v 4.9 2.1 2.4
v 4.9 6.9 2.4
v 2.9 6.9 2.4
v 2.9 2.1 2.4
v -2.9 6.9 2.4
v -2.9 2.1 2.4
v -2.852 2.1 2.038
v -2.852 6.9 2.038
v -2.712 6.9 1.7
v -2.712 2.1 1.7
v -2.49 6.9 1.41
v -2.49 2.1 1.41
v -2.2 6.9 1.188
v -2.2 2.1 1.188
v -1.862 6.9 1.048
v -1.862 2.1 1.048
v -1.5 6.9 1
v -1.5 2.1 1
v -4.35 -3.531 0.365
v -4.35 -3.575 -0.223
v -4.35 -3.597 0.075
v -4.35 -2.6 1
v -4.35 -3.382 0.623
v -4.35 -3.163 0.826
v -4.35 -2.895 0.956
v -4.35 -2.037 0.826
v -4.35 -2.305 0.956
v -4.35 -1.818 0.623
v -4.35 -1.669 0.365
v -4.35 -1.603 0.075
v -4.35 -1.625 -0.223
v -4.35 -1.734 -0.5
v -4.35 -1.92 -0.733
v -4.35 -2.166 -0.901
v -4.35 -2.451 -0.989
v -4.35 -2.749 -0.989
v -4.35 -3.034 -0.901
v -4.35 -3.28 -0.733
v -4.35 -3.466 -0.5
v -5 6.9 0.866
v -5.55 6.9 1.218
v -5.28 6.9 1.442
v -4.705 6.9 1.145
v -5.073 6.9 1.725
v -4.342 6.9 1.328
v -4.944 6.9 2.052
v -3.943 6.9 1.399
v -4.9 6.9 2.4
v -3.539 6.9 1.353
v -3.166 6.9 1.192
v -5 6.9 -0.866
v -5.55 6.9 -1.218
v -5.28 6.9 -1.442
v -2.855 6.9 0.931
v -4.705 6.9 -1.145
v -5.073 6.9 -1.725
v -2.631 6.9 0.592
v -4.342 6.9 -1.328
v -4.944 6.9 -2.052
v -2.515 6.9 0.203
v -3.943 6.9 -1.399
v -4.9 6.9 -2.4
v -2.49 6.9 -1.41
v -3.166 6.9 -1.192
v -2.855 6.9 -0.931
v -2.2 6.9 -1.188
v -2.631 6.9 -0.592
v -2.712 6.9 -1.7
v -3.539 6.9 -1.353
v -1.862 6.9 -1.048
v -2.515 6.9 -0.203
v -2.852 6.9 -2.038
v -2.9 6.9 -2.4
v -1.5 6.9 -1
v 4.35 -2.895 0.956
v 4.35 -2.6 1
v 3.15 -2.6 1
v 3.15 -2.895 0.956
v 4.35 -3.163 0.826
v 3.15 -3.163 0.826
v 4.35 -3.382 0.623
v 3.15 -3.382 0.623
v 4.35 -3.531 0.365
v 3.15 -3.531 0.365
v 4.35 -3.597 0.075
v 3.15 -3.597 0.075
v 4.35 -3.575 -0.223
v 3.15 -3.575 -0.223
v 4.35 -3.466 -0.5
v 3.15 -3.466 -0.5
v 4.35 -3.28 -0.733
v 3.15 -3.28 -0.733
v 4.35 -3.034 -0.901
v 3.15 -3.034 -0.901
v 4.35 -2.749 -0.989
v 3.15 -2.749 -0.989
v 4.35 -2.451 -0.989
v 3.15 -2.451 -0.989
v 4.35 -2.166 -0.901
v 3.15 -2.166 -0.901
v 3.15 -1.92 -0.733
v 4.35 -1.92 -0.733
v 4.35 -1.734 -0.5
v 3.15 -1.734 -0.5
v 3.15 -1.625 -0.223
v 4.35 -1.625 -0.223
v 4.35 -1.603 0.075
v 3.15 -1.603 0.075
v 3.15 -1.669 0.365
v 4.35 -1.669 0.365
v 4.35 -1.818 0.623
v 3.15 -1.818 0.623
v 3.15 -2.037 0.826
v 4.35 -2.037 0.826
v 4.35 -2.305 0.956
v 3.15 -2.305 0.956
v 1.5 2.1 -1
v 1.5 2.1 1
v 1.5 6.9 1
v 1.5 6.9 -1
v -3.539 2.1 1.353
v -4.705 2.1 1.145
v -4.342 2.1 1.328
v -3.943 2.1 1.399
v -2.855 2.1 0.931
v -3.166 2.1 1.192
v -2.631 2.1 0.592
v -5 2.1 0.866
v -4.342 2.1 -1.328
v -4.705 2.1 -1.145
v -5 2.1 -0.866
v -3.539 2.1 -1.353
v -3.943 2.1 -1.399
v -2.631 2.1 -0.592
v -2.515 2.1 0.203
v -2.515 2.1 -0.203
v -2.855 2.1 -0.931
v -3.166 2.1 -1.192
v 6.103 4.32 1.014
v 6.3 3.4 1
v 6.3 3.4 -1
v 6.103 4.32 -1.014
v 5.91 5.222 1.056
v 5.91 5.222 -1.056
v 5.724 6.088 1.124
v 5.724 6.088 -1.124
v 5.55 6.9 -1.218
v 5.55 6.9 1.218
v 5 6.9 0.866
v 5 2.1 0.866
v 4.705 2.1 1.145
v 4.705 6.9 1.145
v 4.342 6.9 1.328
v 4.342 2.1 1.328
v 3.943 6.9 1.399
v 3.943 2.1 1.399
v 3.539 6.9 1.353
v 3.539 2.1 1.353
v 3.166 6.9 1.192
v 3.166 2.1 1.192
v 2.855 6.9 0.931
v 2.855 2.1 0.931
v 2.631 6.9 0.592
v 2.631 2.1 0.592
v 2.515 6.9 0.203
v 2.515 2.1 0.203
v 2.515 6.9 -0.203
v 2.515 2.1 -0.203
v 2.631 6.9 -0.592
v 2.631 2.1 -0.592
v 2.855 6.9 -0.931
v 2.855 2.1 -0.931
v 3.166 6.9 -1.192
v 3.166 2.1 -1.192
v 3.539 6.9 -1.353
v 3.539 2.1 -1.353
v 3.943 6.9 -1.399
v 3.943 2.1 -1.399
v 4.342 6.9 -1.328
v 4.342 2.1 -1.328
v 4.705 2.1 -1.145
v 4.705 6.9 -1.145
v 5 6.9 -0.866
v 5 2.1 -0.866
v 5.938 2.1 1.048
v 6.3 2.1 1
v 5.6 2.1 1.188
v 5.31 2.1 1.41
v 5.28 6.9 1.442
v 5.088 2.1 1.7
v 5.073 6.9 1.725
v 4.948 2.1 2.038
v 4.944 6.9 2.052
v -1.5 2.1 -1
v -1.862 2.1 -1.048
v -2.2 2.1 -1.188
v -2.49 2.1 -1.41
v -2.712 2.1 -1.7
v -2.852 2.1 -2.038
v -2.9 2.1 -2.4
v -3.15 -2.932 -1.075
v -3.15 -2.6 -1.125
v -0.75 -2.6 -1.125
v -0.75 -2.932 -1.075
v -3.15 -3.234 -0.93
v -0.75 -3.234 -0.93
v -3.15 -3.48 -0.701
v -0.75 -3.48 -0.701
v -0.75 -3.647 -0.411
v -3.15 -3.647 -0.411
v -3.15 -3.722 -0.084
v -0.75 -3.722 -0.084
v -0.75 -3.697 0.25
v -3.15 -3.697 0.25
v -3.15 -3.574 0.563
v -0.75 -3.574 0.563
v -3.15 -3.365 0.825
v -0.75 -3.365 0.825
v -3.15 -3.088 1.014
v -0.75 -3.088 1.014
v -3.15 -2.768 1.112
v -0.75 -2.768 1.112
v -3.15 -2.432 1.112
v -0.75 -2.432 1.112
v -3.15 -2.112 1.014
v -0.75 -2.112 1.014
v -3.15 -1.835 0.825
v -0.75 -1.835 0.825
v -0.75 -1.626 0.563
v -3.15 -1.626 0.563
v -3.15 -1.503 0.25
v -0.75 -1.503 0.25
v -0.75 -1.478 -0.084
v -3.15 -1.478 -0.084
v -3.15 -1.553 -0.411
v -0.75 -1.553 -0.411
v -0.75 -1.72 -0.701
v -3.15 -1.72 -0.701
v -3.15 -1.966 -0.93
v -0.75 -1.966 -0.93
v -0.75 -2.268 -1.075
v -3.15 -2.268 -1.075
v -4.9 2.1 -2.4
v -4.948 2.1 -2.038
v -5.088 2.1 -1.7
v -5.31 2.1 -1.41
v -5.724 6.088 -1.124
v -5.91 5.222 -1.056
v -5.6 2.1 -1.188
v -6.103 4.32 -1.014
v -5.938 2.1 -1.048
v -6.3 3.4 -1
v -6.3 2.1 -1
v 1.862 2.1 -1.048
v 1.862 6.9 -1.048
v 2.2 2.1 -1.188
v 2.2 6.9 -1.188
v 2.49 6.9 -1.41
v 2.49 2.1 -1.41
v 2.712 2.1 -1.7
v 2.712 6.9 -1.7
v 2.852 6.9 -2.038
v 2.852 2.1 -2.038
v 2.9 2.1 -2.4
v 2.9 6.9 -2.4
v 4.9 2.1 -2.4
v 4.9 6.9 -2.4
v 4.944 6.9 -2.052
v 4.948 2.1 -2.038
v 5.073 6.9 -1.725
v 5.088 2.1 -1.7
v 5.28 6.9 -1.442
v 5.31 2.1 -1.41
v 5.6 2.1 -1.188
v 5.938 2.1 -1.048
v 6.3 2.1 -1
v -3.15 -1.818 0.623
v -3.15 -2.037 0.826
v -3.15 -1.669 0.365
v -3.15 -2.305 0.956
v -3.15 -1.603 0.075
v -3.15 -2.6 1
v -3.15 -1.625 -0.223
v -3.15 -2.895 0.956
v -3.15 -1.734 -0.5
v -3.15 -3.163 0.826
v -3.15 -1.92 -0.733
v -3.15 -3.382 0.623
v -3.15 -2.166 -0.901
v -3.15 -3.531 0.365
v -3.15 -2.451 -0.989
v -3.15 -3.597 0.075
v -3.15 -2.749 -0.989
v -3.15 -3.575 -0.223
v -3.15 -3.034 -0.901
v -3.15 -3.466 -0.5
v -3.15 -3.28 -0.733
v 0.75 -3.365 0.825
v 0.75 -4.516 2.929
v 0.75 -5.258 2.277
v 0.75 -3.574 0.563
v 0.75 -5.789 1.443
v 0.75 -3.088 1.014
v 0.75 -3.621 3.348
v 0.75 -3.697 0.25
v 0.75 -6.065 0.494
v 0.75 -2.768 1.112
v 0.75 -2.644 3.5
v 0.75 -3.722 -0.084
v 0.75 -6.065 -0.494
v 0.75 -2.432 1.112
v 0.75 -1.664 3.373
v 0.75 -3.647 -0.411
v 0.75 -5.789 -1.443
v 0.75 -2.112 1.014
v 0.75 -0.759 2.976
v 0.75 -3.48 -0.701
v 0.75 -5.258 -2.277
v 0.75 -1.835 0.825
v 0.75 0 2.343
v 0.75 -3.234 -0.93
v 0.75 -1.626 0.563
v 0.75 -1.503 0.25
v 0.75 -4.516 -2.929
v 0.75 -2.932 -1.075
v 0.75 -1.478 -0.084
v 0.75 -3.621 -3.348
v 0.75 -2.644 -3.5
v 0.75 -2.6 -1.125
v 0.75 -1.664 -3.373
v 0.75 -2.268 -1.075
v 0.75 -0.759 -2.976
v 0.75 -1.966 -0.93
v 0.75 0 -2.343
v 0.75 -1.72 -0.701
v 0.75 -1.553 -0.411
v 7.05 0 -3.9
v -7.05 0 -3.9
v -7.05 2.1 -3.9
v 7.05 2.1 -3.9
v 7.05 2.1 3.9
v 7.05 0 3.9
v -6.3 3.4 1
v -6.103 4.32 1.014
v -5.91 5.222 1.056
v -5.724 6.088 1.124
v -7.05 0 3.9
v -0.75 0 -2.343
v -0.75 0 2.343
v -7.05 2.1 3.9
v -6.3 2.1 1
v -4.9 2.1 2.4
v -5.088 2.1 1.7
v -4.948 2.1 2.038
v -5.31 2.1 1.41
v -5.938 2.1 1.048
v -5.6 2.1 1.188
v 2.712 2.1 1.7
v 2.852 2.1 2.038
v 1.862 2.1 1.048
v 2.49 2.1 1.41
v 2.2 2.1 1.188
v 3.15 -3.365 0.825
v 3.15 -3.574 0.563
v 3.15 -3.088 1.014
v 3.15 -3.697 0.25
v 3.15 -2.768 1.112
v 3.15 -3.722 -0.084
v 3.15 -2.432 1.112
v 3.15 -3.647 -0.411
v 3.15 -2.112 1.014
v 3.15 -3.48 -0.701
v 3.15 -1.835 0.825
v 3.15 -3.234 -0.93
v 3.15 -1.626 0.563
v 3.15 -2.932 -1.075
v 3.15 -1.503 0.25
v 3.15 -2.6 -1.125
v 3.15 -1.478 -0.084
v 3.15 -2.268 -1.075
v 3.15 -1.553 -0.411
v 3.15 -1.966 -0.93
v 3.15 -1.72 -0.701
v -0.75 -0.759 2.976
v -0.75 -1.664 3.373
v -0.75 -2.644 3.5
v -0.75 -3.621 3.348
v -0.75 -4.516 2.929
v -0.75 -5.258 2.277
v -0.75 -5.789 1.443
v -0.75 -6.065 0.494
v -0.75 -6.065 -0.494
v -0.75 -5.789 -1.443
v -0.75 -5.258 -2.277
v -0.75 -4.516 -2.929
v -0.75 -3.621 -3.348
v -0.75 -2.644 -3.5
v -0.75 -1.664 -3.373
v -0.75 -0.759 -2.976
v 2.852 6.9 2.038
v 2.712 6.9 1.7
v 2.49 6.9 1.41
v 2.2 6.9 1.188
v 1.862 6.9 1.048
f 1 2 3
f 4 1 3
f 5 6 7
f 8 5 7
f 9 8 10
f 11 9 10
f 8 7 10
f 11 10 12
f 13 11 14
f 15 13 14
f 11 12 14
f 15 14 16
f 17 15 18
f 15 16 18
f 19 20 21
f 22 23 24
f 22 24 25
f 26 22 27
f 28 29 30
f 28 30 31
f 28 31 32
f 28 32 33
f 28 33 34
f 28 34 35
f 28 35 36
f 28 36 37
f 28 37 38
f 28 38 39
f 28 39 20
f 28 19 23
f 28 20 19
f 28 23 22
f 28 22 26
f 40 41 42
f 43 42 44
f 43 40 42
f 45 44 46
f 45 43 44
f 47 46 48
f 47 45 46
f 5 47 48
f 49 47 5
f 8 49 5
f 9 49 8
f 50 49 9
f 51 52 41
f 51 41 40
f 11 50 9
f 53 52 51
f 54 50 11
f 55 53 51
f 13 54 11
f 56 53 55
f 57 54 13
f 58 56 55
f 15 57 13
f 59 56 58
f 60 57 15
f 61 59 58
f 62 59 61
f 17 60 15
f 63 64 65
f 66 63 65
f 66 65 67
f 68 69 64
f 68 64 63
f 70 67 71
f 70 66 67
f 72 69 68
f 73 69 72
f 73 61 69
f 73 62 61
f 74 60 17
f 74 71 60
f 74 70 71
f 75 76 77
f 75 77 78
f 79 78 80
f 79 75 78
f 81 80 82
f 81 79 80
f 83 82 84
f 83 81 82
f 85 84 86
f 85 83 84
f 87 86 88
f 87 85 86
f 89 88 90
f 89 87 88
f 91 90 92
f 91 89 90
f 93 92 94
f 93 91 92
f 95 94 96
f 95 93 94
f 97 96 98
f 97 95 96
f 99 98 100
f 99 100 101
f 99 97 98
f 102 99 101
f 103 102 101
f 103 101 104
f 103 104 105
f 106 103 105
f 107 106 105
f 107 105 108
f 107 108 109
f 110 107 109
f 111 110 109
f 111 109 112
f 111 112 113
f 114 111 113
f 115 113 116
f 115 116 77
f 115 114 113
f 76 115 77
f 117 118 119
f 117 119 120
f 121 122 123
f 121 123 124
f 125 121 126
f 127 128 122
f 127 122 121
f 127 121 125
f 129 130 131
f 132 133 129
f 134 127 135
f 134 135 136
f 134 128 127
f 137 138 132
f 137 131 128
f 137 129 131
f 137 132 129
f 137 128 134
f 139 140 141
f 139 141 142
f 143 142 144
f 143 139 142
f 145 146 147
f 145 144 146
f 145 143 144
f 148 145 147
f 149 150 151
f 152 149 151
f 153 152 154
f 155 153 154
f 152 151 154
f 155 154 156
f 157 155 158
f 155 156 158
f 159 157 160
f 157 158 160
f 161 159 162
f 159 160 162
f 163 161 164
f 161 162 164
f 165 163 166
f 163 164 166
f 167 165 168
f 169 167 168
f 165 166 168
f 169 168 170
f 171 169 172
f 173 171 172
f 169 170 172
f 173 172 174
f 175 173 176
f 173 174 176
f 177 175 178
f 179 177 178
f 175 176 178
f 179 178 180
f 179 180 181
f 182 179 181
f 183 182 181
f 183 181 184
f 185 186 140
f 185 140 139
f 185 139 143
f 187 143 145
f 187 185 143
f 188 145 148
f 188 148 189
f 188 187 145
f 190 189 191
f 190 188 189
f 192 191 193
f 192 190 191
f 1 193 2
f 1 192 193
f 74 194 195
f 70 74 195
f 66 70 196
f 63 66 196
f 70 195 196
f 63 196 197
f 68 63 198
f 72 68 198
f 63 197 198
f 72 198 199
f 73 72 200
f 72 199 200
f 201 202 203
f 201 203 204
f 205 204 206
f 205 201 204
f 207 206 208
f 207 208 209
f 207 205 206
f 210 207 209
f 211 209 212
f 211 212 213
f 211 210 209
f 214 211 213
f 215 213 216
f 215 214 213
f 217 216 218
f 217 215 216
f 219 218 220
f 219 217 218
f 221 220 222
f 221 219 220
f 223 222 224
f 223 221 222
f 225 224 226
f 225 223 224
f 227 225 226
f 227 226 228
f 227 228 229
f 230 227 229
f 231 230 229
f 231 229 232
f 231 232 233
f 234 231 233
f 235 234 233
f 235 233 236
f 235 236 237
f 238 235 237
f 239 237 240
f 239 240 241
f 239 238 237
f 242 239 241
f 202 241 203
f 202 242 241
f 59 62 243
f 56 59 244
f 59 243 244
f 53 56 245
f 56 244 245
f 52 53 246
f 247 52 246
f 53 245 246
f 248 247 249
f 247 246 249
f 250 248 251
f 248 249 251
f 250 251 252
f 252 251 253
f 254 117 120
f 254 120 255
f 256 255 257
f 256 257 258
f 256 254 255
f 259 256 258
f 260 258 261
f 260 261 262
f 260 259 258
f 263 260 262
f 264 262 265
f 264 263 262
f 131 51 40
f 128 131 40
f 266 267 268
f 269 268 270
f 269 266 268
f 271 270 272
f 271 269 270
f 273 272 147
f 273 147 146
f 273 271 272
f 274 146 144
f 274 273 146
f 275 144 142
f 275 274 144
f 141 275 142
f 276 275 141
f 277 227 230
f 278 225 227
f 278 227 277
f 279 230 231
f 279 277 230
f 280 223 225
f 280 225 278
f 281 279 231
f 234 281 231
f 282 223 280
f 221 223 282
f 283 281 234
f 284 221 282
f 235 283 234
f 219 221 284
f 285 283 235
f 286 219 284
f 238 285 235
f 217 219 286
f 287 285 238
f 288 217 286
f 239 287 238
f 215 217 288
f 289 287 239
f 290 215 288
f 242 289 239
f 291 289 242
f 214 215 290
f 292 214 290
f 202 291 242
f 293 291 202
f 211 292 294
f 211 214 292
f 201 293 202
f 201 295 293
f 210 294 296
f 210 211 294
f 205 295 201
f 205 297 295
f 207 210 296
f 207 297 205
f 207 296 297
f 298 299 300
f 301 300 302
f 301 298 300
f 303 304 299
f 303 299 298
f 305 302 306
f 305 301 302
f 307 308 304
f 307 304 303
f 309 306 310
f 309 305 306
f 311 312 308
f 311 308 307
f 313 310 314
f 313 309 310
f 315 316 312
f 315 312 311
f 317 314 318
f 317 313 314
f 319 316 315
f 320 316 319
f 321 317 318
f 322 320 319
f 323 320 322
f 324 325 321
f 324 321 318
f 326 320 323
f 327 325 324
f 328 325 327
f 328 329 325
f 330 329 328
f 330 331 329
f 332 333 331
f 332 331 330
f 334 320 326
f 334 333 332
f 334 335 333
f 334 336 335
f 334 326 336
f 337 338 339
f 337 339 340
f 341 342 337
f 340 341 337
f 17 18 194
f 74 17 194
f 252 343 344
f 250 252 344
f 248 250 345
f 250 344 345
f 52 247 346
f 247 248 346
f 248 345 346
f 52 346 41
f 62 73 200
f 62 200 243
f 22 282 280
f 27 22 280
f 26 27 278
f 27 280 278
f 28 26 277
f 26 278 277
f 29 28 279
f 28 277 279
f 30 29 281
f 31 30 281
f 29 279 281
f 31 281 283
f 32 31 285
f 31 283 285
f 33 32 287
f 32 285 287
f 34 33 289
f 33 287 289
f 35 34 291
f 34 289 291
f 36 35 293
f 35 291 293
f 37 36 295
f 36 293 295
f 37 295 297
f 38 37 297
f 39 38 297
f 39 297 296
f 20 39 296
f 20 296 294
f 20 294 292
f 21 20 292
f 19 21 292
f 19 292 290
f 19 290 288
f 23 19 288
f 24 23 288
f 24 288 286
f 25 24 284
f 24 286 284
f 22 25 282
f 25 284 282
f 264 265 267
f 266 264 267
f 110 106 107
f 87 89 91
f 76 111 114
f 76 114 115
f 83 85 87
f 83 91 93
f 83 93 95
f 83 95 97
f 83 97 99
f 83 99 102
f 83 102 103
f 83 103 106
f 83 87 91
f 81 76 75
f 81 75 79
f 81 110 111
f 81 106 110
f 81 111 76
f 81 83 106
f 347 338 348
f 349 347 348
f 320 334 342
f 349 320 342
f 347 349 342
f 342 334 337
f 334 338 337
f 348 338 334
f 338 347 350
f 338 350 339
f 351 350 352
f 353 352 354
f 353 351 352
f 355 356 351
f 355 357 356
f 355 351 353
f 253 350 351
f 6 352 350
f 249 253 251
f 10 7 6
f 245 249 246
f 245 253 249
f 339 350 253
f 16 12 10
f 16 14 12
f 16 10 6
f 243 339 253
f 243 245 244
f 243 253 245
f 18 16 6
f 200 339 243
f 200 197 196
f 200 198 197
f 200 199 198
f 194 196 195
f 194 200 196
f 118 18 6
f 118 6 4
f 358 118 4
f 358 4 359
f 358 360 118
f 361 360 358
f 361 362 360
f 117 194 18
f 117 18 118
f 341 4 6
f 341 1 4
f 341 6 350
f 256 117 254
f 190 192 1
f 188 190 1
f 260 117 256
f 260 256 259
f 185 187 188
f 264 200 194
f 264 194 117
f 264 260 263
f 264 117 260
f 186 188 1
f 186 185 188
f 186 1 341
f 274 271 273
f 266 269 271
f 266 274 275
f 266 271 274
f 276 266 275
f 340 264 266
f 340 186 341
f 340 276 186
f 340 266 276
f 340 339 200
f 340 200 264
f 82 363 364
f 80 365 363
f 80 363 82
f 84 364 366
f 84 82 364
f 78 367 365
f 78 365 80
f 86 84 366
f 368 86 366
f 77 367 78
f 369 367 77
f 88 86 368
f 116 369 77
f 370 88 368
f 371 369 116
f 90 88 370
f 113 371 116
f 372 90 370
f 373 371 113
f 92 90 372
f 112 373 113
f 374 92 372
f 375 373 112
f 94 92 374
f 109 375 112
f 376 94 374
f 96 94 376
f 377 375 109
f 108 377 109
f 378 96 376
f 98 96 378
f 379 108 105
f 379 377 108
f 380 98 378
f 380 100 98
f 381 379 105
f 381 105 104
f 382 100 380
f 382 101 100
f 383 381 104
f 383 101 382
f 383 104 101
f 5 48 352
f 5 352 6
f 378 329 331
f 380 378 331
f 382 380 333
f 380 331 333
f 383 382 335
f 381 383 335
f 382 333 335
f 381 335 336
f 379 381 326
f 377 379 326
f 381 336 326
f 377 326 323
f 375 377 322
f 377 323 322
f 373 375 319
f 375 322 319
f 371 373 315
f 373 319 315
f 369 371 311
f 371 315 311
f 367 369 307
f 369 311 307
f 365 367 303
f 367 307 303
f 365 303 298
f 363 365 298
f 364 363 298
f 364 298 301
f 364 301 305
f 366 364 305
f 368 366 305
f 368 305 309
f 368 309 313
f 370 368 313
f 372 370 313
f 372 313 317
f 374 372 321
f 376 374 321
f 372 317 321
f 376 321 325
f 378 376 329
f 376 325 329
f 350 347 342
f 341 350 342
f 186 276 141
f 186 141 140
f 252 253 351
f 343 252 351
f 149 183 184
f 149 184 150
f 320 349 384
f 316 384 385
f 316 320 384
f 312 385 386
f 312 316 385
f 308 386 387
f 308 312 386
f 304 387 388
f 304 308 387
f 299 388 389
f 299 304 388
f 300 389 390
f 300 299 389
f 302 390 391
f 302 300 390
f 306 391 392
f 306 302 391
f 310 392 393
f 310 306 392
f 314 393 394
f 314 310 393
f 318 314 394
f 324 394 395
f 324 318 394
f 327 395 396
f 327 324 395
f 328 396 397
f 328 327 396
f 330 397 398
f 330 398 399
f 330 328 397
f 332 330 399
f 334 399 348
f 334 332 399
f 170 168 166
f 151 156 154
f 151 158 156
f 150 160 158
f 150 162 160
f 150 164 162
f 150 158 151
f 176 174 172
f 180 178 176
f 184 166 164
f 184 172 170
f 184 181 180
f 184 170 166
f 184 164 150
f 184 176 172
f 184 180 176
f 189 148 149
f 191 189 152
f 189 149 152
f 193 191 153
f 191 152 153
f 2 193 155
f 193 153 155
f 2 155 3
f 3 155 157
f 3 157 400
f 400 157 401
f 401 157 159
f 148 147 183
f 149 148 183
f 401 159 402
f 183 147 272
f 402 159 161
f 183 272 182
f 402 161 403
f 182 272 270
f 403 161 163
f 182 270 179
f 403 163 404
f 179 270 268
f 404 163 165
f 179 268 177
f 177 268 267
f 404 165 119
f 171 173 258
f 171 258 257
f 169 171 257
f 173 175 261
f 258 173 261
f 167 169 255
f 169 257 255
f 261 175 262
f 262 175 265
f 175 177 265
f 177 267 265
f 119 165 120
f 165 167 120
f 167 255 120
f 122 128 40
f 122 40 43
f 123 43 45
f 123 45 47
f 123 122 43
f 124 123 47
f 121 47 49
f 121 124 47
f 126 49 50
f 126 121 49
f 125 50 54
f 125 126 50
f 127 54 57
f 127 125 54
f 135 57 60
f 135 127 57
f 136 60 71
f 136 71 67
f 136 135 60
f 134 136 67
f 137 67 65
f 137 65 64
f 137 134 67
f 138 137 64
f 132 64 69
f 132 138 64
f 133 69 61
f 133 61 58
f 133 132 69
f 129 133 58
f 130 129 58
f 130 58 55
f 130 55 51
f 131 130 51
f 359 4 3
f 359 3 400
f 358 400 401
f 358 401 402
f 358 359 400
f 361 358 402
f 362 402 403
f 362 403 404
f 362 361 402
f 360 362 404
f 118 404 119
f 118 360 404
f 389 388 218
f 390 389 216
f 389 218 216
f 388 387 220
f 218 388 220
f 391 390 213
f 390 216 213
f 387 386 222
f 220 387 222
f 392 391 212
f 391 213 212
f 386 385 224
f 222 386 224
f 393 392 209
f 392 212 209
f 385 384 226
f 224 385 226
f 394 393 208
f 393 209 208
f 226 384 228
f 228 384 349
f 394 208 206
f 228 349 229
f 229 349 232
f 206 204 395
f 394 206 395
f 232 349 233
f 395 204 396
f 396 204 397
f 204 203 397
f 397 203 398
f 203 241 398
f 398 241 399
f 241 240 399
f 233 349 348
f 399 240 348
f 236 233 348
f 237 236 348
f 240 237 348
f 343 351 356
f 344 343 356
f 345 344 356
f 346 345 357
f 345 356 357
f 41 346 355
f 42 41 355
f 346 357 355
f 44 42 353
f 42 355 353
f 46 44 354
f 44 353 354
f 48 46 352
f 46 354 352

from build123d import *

# Parameters (mm, degrees)
SKETCH1_W           = 14.1
SKETCH1_H           = 7.8
BOSS_EXTRUDE3_DEPTH = 2.1
BOSS_EXTRUDE4_DEPTH = 4.8
CHAMFER1_START      = 6.87255411
CHAMFER1_OUTLINE_W  = 6
CHAMFER1_OUTLINE_H  = 6
CHAMFER1_DEPTH      = 2.12744589
CHAMFER2_START      = -9
CHAMFER2_OUTLINE_W  = 6
CHAMFER2_OUTLINE_H  = 6
CHAMFER2_DEPTH      = 2.12744589
SKETCH6_R           = 3.5
BOSS_EXTRUDE5_DEPTH = 0.75
SKETCH7_R           = 1.125
BOSS_EXTRUDE6_DEPTH = 2.4
BOSS_EXTRUDE7_START = 2.4
SKETCH9_R           = 1.125
BOSS_EXTRUDE7_DEPTH = 2.4
SKETCH10_R          = 1
BOSS_EXTRUDE8_DEPTH = 1.2
BOSS_EXTRUDE9_START = 1.2
SKETCH11_R          = 1
BOSS_EXTRUDE9_DEPTH = 1.2


with BuildPart() as part:
    # Sketch1 → Boss-Extrude3 (new body)
    with BuildSketch(Plane(origin=(0, 0, 0), x_dir=(1, 0, 0), z_dir=(0, 1, 0))):
        Rectangle(SKETCH1_W, SKETCH1_H)
    extrude(amount=BOSS_EXTRUDE3_DEPTH)

    # Sketch3 → Boss-Extrude4 (add)
    # profile 1 of 2: a face of its own
    with BuildSketch(Plane(origin=(0, 2.1, 0), x_dir=(1, 0, 0), z_dir=(0, 1, 0))):
        with BuildLine():
            Line((2.9, 2.4), (4.9, 2.4))
            ThreePointArc((4.9, 2.4), (5.310050506, 1.410050506), (6.3, 1))
            Line((6.3, 1), (6.3, -1))
            ThreePointArc((6.3, -1), (5.310050506, -1.410050506), (4.9, -2.4))
            Line((4.9, -2.4), (2.9, -2.4))
            ThreePointArc((2.9, -2.4), (2.489949494, -1.410050506), (1.5, -1))
            Line((1.5, -1), (1.5, 1))
            ThreePointArc((1.5, 1), (2.489949494, 1.410050506), (2.9, 2.4))
        make_face()
        with BuildLine():
            Line((5, 0.866025404), (5, -0.866025404))
            ThreePointArc((5, -0.866025404), (2.5, 0), (5, 0.866025404))
        make_face(mode=Mode.SUBTRACT)
    # profile 2 of 2: a face of its own
    with BuildSketch(Plane(origin=(0, 2.1, 0), x_dir=(1, 0, 0), z_dir=(0, 1, 0))):
        with BuildLine():
            Line((-6.3, 1), (-6.3, -1))
            ThreePointArc((-6.3, -1), (-5.310050506, -1.410050506), (-4.9, -2.4))
            Line((-4.9, -2.4), (-2.9, -2.4))
            ThreePointArc((-2.9, -2.4), (-2.489949494, -1.410050506), (-1.5, -1))
            Line((-1.5, -1), (-1.5, 1))
            ThreePointArc((-1.5, 1), (-2.489949494, 1.410050506), (-2.9, 2.4))
            Line((-2.9, 2.4), (-4.9, 2.4))
            ThreePointArc((-4.9, 2.4), (-5.310050506, 1.410050506), (-6.3, 1))
        make_face()
        with BuildLine():
            Line((-5, 0.866025404), (-5, -0.866025404))
            ThreePointArc((-5, -0.866025404), (-2.5, 0), (-5, 0.866025404))
        make_face(mode=Mode.SUBTRACT)
    extrude(amount=BOSS_EXTRUDE4_DEPTH)

    # Chamfer1: read off the stored shape, not the designer's step
    # Chamfer1 outline → Chamfer1 (cut)
    with BuildSketch(Plane(origin=(0, 0, 0), x_dir=(-0.20952908873087314, 0.9778024140774096, 0), z_dir=(0.9778024140774096, 0.20952908873087314, 0)).offset(CHAMFER1_START)):
        with Locations((4, 0)):
            Rectangle(CHAMFER1_OUTLINE_W, CHAMFER1_OUTLINE_H)
    extrude(amount=CHAMFER1_DEPTH, mode=Mode.SUBTRACT)

    # Chamfer2: read off the stored shape, not the designer's step
    # Chamfer2 outline → Chamfer2 (cut)
    with BuildSketch(Plane(origin=(0, 0, 0), x_dir=(0.20952908873087314, 0.9778024140774096, 0), z_dir=(0.9778024140774096, -0.20952908873087314, 0)).offset(CHAMFER2_START)):
        with Locations((4, 0)):
            Rectangle(CHAMFER2_OUTLINE_W, CHAMFER2_OUTLINE_H)
    extrude(amount=CHAMFER2_DEPTH, mode=Mode.SUBTRACT)

    # Sketch6 → Boss-Extrude5 (add, symmetric)
    with BuildSketch(Plane(origin=(0, 0, 0), x_dir=(0, 0, -1), z_dir=(1, 0, 0))):
        with Locations((0, -2.6)):
            Circle(SKETCH6_R)
    extrude(amount=BOSS_EXTRUDE5_DEPTH, both=True)

    # Sketch7 → Boss-Extrude6 (add)
    with BuildSketch(Plane(origin=(0.75, 0, 0), x_dir=(0, 0, -1), z_dir=(1, 0, 0))):
        with Locations((0, -2.6)):
            Circle(SKETCH7_R)
    extrude(amount=BOSS_EXTRUDE6_DEPTH)

    # Sketch9 → Boss-Extrude7 (add)
    with BuildSketch(Plane.ZY.offset(0.75).offset(BOSS_EXTRUDE7_START)):
        with Locations(Location((0, -2.6, 0), (0, 0, 180))):
            Circle(SKETCH9_R)
    extrude(amount=-BOSS_EXTRUDE7_DEPTH)

    # Sketch10 → Boss-Extrude8 (add)
    with BuildSketch(Plane.ZY.offset(3.15)):
        with Locations((0, -2.6)):
            Circle(SKETCH10_R)
    extrude(amount=BOSS_EXTRUDE8_DEPTH)

    # Sketch11 → Boss-Extrude9 (add)
    with BuildSketch(Plane(origin=(3.15, 0, 0), x_dir=(0, 0, -1), z_dir=(1, 0, 0)).offset(BOSS_EXTRUDE9_START)):
        with Locations(Location((0, -2.6, 0), (0, 0, 180))):
            Circle(SKETCH11_R)
    extrude(amount=-BOSS_EXTRUDE9_DEPTH)


solid = part.part
